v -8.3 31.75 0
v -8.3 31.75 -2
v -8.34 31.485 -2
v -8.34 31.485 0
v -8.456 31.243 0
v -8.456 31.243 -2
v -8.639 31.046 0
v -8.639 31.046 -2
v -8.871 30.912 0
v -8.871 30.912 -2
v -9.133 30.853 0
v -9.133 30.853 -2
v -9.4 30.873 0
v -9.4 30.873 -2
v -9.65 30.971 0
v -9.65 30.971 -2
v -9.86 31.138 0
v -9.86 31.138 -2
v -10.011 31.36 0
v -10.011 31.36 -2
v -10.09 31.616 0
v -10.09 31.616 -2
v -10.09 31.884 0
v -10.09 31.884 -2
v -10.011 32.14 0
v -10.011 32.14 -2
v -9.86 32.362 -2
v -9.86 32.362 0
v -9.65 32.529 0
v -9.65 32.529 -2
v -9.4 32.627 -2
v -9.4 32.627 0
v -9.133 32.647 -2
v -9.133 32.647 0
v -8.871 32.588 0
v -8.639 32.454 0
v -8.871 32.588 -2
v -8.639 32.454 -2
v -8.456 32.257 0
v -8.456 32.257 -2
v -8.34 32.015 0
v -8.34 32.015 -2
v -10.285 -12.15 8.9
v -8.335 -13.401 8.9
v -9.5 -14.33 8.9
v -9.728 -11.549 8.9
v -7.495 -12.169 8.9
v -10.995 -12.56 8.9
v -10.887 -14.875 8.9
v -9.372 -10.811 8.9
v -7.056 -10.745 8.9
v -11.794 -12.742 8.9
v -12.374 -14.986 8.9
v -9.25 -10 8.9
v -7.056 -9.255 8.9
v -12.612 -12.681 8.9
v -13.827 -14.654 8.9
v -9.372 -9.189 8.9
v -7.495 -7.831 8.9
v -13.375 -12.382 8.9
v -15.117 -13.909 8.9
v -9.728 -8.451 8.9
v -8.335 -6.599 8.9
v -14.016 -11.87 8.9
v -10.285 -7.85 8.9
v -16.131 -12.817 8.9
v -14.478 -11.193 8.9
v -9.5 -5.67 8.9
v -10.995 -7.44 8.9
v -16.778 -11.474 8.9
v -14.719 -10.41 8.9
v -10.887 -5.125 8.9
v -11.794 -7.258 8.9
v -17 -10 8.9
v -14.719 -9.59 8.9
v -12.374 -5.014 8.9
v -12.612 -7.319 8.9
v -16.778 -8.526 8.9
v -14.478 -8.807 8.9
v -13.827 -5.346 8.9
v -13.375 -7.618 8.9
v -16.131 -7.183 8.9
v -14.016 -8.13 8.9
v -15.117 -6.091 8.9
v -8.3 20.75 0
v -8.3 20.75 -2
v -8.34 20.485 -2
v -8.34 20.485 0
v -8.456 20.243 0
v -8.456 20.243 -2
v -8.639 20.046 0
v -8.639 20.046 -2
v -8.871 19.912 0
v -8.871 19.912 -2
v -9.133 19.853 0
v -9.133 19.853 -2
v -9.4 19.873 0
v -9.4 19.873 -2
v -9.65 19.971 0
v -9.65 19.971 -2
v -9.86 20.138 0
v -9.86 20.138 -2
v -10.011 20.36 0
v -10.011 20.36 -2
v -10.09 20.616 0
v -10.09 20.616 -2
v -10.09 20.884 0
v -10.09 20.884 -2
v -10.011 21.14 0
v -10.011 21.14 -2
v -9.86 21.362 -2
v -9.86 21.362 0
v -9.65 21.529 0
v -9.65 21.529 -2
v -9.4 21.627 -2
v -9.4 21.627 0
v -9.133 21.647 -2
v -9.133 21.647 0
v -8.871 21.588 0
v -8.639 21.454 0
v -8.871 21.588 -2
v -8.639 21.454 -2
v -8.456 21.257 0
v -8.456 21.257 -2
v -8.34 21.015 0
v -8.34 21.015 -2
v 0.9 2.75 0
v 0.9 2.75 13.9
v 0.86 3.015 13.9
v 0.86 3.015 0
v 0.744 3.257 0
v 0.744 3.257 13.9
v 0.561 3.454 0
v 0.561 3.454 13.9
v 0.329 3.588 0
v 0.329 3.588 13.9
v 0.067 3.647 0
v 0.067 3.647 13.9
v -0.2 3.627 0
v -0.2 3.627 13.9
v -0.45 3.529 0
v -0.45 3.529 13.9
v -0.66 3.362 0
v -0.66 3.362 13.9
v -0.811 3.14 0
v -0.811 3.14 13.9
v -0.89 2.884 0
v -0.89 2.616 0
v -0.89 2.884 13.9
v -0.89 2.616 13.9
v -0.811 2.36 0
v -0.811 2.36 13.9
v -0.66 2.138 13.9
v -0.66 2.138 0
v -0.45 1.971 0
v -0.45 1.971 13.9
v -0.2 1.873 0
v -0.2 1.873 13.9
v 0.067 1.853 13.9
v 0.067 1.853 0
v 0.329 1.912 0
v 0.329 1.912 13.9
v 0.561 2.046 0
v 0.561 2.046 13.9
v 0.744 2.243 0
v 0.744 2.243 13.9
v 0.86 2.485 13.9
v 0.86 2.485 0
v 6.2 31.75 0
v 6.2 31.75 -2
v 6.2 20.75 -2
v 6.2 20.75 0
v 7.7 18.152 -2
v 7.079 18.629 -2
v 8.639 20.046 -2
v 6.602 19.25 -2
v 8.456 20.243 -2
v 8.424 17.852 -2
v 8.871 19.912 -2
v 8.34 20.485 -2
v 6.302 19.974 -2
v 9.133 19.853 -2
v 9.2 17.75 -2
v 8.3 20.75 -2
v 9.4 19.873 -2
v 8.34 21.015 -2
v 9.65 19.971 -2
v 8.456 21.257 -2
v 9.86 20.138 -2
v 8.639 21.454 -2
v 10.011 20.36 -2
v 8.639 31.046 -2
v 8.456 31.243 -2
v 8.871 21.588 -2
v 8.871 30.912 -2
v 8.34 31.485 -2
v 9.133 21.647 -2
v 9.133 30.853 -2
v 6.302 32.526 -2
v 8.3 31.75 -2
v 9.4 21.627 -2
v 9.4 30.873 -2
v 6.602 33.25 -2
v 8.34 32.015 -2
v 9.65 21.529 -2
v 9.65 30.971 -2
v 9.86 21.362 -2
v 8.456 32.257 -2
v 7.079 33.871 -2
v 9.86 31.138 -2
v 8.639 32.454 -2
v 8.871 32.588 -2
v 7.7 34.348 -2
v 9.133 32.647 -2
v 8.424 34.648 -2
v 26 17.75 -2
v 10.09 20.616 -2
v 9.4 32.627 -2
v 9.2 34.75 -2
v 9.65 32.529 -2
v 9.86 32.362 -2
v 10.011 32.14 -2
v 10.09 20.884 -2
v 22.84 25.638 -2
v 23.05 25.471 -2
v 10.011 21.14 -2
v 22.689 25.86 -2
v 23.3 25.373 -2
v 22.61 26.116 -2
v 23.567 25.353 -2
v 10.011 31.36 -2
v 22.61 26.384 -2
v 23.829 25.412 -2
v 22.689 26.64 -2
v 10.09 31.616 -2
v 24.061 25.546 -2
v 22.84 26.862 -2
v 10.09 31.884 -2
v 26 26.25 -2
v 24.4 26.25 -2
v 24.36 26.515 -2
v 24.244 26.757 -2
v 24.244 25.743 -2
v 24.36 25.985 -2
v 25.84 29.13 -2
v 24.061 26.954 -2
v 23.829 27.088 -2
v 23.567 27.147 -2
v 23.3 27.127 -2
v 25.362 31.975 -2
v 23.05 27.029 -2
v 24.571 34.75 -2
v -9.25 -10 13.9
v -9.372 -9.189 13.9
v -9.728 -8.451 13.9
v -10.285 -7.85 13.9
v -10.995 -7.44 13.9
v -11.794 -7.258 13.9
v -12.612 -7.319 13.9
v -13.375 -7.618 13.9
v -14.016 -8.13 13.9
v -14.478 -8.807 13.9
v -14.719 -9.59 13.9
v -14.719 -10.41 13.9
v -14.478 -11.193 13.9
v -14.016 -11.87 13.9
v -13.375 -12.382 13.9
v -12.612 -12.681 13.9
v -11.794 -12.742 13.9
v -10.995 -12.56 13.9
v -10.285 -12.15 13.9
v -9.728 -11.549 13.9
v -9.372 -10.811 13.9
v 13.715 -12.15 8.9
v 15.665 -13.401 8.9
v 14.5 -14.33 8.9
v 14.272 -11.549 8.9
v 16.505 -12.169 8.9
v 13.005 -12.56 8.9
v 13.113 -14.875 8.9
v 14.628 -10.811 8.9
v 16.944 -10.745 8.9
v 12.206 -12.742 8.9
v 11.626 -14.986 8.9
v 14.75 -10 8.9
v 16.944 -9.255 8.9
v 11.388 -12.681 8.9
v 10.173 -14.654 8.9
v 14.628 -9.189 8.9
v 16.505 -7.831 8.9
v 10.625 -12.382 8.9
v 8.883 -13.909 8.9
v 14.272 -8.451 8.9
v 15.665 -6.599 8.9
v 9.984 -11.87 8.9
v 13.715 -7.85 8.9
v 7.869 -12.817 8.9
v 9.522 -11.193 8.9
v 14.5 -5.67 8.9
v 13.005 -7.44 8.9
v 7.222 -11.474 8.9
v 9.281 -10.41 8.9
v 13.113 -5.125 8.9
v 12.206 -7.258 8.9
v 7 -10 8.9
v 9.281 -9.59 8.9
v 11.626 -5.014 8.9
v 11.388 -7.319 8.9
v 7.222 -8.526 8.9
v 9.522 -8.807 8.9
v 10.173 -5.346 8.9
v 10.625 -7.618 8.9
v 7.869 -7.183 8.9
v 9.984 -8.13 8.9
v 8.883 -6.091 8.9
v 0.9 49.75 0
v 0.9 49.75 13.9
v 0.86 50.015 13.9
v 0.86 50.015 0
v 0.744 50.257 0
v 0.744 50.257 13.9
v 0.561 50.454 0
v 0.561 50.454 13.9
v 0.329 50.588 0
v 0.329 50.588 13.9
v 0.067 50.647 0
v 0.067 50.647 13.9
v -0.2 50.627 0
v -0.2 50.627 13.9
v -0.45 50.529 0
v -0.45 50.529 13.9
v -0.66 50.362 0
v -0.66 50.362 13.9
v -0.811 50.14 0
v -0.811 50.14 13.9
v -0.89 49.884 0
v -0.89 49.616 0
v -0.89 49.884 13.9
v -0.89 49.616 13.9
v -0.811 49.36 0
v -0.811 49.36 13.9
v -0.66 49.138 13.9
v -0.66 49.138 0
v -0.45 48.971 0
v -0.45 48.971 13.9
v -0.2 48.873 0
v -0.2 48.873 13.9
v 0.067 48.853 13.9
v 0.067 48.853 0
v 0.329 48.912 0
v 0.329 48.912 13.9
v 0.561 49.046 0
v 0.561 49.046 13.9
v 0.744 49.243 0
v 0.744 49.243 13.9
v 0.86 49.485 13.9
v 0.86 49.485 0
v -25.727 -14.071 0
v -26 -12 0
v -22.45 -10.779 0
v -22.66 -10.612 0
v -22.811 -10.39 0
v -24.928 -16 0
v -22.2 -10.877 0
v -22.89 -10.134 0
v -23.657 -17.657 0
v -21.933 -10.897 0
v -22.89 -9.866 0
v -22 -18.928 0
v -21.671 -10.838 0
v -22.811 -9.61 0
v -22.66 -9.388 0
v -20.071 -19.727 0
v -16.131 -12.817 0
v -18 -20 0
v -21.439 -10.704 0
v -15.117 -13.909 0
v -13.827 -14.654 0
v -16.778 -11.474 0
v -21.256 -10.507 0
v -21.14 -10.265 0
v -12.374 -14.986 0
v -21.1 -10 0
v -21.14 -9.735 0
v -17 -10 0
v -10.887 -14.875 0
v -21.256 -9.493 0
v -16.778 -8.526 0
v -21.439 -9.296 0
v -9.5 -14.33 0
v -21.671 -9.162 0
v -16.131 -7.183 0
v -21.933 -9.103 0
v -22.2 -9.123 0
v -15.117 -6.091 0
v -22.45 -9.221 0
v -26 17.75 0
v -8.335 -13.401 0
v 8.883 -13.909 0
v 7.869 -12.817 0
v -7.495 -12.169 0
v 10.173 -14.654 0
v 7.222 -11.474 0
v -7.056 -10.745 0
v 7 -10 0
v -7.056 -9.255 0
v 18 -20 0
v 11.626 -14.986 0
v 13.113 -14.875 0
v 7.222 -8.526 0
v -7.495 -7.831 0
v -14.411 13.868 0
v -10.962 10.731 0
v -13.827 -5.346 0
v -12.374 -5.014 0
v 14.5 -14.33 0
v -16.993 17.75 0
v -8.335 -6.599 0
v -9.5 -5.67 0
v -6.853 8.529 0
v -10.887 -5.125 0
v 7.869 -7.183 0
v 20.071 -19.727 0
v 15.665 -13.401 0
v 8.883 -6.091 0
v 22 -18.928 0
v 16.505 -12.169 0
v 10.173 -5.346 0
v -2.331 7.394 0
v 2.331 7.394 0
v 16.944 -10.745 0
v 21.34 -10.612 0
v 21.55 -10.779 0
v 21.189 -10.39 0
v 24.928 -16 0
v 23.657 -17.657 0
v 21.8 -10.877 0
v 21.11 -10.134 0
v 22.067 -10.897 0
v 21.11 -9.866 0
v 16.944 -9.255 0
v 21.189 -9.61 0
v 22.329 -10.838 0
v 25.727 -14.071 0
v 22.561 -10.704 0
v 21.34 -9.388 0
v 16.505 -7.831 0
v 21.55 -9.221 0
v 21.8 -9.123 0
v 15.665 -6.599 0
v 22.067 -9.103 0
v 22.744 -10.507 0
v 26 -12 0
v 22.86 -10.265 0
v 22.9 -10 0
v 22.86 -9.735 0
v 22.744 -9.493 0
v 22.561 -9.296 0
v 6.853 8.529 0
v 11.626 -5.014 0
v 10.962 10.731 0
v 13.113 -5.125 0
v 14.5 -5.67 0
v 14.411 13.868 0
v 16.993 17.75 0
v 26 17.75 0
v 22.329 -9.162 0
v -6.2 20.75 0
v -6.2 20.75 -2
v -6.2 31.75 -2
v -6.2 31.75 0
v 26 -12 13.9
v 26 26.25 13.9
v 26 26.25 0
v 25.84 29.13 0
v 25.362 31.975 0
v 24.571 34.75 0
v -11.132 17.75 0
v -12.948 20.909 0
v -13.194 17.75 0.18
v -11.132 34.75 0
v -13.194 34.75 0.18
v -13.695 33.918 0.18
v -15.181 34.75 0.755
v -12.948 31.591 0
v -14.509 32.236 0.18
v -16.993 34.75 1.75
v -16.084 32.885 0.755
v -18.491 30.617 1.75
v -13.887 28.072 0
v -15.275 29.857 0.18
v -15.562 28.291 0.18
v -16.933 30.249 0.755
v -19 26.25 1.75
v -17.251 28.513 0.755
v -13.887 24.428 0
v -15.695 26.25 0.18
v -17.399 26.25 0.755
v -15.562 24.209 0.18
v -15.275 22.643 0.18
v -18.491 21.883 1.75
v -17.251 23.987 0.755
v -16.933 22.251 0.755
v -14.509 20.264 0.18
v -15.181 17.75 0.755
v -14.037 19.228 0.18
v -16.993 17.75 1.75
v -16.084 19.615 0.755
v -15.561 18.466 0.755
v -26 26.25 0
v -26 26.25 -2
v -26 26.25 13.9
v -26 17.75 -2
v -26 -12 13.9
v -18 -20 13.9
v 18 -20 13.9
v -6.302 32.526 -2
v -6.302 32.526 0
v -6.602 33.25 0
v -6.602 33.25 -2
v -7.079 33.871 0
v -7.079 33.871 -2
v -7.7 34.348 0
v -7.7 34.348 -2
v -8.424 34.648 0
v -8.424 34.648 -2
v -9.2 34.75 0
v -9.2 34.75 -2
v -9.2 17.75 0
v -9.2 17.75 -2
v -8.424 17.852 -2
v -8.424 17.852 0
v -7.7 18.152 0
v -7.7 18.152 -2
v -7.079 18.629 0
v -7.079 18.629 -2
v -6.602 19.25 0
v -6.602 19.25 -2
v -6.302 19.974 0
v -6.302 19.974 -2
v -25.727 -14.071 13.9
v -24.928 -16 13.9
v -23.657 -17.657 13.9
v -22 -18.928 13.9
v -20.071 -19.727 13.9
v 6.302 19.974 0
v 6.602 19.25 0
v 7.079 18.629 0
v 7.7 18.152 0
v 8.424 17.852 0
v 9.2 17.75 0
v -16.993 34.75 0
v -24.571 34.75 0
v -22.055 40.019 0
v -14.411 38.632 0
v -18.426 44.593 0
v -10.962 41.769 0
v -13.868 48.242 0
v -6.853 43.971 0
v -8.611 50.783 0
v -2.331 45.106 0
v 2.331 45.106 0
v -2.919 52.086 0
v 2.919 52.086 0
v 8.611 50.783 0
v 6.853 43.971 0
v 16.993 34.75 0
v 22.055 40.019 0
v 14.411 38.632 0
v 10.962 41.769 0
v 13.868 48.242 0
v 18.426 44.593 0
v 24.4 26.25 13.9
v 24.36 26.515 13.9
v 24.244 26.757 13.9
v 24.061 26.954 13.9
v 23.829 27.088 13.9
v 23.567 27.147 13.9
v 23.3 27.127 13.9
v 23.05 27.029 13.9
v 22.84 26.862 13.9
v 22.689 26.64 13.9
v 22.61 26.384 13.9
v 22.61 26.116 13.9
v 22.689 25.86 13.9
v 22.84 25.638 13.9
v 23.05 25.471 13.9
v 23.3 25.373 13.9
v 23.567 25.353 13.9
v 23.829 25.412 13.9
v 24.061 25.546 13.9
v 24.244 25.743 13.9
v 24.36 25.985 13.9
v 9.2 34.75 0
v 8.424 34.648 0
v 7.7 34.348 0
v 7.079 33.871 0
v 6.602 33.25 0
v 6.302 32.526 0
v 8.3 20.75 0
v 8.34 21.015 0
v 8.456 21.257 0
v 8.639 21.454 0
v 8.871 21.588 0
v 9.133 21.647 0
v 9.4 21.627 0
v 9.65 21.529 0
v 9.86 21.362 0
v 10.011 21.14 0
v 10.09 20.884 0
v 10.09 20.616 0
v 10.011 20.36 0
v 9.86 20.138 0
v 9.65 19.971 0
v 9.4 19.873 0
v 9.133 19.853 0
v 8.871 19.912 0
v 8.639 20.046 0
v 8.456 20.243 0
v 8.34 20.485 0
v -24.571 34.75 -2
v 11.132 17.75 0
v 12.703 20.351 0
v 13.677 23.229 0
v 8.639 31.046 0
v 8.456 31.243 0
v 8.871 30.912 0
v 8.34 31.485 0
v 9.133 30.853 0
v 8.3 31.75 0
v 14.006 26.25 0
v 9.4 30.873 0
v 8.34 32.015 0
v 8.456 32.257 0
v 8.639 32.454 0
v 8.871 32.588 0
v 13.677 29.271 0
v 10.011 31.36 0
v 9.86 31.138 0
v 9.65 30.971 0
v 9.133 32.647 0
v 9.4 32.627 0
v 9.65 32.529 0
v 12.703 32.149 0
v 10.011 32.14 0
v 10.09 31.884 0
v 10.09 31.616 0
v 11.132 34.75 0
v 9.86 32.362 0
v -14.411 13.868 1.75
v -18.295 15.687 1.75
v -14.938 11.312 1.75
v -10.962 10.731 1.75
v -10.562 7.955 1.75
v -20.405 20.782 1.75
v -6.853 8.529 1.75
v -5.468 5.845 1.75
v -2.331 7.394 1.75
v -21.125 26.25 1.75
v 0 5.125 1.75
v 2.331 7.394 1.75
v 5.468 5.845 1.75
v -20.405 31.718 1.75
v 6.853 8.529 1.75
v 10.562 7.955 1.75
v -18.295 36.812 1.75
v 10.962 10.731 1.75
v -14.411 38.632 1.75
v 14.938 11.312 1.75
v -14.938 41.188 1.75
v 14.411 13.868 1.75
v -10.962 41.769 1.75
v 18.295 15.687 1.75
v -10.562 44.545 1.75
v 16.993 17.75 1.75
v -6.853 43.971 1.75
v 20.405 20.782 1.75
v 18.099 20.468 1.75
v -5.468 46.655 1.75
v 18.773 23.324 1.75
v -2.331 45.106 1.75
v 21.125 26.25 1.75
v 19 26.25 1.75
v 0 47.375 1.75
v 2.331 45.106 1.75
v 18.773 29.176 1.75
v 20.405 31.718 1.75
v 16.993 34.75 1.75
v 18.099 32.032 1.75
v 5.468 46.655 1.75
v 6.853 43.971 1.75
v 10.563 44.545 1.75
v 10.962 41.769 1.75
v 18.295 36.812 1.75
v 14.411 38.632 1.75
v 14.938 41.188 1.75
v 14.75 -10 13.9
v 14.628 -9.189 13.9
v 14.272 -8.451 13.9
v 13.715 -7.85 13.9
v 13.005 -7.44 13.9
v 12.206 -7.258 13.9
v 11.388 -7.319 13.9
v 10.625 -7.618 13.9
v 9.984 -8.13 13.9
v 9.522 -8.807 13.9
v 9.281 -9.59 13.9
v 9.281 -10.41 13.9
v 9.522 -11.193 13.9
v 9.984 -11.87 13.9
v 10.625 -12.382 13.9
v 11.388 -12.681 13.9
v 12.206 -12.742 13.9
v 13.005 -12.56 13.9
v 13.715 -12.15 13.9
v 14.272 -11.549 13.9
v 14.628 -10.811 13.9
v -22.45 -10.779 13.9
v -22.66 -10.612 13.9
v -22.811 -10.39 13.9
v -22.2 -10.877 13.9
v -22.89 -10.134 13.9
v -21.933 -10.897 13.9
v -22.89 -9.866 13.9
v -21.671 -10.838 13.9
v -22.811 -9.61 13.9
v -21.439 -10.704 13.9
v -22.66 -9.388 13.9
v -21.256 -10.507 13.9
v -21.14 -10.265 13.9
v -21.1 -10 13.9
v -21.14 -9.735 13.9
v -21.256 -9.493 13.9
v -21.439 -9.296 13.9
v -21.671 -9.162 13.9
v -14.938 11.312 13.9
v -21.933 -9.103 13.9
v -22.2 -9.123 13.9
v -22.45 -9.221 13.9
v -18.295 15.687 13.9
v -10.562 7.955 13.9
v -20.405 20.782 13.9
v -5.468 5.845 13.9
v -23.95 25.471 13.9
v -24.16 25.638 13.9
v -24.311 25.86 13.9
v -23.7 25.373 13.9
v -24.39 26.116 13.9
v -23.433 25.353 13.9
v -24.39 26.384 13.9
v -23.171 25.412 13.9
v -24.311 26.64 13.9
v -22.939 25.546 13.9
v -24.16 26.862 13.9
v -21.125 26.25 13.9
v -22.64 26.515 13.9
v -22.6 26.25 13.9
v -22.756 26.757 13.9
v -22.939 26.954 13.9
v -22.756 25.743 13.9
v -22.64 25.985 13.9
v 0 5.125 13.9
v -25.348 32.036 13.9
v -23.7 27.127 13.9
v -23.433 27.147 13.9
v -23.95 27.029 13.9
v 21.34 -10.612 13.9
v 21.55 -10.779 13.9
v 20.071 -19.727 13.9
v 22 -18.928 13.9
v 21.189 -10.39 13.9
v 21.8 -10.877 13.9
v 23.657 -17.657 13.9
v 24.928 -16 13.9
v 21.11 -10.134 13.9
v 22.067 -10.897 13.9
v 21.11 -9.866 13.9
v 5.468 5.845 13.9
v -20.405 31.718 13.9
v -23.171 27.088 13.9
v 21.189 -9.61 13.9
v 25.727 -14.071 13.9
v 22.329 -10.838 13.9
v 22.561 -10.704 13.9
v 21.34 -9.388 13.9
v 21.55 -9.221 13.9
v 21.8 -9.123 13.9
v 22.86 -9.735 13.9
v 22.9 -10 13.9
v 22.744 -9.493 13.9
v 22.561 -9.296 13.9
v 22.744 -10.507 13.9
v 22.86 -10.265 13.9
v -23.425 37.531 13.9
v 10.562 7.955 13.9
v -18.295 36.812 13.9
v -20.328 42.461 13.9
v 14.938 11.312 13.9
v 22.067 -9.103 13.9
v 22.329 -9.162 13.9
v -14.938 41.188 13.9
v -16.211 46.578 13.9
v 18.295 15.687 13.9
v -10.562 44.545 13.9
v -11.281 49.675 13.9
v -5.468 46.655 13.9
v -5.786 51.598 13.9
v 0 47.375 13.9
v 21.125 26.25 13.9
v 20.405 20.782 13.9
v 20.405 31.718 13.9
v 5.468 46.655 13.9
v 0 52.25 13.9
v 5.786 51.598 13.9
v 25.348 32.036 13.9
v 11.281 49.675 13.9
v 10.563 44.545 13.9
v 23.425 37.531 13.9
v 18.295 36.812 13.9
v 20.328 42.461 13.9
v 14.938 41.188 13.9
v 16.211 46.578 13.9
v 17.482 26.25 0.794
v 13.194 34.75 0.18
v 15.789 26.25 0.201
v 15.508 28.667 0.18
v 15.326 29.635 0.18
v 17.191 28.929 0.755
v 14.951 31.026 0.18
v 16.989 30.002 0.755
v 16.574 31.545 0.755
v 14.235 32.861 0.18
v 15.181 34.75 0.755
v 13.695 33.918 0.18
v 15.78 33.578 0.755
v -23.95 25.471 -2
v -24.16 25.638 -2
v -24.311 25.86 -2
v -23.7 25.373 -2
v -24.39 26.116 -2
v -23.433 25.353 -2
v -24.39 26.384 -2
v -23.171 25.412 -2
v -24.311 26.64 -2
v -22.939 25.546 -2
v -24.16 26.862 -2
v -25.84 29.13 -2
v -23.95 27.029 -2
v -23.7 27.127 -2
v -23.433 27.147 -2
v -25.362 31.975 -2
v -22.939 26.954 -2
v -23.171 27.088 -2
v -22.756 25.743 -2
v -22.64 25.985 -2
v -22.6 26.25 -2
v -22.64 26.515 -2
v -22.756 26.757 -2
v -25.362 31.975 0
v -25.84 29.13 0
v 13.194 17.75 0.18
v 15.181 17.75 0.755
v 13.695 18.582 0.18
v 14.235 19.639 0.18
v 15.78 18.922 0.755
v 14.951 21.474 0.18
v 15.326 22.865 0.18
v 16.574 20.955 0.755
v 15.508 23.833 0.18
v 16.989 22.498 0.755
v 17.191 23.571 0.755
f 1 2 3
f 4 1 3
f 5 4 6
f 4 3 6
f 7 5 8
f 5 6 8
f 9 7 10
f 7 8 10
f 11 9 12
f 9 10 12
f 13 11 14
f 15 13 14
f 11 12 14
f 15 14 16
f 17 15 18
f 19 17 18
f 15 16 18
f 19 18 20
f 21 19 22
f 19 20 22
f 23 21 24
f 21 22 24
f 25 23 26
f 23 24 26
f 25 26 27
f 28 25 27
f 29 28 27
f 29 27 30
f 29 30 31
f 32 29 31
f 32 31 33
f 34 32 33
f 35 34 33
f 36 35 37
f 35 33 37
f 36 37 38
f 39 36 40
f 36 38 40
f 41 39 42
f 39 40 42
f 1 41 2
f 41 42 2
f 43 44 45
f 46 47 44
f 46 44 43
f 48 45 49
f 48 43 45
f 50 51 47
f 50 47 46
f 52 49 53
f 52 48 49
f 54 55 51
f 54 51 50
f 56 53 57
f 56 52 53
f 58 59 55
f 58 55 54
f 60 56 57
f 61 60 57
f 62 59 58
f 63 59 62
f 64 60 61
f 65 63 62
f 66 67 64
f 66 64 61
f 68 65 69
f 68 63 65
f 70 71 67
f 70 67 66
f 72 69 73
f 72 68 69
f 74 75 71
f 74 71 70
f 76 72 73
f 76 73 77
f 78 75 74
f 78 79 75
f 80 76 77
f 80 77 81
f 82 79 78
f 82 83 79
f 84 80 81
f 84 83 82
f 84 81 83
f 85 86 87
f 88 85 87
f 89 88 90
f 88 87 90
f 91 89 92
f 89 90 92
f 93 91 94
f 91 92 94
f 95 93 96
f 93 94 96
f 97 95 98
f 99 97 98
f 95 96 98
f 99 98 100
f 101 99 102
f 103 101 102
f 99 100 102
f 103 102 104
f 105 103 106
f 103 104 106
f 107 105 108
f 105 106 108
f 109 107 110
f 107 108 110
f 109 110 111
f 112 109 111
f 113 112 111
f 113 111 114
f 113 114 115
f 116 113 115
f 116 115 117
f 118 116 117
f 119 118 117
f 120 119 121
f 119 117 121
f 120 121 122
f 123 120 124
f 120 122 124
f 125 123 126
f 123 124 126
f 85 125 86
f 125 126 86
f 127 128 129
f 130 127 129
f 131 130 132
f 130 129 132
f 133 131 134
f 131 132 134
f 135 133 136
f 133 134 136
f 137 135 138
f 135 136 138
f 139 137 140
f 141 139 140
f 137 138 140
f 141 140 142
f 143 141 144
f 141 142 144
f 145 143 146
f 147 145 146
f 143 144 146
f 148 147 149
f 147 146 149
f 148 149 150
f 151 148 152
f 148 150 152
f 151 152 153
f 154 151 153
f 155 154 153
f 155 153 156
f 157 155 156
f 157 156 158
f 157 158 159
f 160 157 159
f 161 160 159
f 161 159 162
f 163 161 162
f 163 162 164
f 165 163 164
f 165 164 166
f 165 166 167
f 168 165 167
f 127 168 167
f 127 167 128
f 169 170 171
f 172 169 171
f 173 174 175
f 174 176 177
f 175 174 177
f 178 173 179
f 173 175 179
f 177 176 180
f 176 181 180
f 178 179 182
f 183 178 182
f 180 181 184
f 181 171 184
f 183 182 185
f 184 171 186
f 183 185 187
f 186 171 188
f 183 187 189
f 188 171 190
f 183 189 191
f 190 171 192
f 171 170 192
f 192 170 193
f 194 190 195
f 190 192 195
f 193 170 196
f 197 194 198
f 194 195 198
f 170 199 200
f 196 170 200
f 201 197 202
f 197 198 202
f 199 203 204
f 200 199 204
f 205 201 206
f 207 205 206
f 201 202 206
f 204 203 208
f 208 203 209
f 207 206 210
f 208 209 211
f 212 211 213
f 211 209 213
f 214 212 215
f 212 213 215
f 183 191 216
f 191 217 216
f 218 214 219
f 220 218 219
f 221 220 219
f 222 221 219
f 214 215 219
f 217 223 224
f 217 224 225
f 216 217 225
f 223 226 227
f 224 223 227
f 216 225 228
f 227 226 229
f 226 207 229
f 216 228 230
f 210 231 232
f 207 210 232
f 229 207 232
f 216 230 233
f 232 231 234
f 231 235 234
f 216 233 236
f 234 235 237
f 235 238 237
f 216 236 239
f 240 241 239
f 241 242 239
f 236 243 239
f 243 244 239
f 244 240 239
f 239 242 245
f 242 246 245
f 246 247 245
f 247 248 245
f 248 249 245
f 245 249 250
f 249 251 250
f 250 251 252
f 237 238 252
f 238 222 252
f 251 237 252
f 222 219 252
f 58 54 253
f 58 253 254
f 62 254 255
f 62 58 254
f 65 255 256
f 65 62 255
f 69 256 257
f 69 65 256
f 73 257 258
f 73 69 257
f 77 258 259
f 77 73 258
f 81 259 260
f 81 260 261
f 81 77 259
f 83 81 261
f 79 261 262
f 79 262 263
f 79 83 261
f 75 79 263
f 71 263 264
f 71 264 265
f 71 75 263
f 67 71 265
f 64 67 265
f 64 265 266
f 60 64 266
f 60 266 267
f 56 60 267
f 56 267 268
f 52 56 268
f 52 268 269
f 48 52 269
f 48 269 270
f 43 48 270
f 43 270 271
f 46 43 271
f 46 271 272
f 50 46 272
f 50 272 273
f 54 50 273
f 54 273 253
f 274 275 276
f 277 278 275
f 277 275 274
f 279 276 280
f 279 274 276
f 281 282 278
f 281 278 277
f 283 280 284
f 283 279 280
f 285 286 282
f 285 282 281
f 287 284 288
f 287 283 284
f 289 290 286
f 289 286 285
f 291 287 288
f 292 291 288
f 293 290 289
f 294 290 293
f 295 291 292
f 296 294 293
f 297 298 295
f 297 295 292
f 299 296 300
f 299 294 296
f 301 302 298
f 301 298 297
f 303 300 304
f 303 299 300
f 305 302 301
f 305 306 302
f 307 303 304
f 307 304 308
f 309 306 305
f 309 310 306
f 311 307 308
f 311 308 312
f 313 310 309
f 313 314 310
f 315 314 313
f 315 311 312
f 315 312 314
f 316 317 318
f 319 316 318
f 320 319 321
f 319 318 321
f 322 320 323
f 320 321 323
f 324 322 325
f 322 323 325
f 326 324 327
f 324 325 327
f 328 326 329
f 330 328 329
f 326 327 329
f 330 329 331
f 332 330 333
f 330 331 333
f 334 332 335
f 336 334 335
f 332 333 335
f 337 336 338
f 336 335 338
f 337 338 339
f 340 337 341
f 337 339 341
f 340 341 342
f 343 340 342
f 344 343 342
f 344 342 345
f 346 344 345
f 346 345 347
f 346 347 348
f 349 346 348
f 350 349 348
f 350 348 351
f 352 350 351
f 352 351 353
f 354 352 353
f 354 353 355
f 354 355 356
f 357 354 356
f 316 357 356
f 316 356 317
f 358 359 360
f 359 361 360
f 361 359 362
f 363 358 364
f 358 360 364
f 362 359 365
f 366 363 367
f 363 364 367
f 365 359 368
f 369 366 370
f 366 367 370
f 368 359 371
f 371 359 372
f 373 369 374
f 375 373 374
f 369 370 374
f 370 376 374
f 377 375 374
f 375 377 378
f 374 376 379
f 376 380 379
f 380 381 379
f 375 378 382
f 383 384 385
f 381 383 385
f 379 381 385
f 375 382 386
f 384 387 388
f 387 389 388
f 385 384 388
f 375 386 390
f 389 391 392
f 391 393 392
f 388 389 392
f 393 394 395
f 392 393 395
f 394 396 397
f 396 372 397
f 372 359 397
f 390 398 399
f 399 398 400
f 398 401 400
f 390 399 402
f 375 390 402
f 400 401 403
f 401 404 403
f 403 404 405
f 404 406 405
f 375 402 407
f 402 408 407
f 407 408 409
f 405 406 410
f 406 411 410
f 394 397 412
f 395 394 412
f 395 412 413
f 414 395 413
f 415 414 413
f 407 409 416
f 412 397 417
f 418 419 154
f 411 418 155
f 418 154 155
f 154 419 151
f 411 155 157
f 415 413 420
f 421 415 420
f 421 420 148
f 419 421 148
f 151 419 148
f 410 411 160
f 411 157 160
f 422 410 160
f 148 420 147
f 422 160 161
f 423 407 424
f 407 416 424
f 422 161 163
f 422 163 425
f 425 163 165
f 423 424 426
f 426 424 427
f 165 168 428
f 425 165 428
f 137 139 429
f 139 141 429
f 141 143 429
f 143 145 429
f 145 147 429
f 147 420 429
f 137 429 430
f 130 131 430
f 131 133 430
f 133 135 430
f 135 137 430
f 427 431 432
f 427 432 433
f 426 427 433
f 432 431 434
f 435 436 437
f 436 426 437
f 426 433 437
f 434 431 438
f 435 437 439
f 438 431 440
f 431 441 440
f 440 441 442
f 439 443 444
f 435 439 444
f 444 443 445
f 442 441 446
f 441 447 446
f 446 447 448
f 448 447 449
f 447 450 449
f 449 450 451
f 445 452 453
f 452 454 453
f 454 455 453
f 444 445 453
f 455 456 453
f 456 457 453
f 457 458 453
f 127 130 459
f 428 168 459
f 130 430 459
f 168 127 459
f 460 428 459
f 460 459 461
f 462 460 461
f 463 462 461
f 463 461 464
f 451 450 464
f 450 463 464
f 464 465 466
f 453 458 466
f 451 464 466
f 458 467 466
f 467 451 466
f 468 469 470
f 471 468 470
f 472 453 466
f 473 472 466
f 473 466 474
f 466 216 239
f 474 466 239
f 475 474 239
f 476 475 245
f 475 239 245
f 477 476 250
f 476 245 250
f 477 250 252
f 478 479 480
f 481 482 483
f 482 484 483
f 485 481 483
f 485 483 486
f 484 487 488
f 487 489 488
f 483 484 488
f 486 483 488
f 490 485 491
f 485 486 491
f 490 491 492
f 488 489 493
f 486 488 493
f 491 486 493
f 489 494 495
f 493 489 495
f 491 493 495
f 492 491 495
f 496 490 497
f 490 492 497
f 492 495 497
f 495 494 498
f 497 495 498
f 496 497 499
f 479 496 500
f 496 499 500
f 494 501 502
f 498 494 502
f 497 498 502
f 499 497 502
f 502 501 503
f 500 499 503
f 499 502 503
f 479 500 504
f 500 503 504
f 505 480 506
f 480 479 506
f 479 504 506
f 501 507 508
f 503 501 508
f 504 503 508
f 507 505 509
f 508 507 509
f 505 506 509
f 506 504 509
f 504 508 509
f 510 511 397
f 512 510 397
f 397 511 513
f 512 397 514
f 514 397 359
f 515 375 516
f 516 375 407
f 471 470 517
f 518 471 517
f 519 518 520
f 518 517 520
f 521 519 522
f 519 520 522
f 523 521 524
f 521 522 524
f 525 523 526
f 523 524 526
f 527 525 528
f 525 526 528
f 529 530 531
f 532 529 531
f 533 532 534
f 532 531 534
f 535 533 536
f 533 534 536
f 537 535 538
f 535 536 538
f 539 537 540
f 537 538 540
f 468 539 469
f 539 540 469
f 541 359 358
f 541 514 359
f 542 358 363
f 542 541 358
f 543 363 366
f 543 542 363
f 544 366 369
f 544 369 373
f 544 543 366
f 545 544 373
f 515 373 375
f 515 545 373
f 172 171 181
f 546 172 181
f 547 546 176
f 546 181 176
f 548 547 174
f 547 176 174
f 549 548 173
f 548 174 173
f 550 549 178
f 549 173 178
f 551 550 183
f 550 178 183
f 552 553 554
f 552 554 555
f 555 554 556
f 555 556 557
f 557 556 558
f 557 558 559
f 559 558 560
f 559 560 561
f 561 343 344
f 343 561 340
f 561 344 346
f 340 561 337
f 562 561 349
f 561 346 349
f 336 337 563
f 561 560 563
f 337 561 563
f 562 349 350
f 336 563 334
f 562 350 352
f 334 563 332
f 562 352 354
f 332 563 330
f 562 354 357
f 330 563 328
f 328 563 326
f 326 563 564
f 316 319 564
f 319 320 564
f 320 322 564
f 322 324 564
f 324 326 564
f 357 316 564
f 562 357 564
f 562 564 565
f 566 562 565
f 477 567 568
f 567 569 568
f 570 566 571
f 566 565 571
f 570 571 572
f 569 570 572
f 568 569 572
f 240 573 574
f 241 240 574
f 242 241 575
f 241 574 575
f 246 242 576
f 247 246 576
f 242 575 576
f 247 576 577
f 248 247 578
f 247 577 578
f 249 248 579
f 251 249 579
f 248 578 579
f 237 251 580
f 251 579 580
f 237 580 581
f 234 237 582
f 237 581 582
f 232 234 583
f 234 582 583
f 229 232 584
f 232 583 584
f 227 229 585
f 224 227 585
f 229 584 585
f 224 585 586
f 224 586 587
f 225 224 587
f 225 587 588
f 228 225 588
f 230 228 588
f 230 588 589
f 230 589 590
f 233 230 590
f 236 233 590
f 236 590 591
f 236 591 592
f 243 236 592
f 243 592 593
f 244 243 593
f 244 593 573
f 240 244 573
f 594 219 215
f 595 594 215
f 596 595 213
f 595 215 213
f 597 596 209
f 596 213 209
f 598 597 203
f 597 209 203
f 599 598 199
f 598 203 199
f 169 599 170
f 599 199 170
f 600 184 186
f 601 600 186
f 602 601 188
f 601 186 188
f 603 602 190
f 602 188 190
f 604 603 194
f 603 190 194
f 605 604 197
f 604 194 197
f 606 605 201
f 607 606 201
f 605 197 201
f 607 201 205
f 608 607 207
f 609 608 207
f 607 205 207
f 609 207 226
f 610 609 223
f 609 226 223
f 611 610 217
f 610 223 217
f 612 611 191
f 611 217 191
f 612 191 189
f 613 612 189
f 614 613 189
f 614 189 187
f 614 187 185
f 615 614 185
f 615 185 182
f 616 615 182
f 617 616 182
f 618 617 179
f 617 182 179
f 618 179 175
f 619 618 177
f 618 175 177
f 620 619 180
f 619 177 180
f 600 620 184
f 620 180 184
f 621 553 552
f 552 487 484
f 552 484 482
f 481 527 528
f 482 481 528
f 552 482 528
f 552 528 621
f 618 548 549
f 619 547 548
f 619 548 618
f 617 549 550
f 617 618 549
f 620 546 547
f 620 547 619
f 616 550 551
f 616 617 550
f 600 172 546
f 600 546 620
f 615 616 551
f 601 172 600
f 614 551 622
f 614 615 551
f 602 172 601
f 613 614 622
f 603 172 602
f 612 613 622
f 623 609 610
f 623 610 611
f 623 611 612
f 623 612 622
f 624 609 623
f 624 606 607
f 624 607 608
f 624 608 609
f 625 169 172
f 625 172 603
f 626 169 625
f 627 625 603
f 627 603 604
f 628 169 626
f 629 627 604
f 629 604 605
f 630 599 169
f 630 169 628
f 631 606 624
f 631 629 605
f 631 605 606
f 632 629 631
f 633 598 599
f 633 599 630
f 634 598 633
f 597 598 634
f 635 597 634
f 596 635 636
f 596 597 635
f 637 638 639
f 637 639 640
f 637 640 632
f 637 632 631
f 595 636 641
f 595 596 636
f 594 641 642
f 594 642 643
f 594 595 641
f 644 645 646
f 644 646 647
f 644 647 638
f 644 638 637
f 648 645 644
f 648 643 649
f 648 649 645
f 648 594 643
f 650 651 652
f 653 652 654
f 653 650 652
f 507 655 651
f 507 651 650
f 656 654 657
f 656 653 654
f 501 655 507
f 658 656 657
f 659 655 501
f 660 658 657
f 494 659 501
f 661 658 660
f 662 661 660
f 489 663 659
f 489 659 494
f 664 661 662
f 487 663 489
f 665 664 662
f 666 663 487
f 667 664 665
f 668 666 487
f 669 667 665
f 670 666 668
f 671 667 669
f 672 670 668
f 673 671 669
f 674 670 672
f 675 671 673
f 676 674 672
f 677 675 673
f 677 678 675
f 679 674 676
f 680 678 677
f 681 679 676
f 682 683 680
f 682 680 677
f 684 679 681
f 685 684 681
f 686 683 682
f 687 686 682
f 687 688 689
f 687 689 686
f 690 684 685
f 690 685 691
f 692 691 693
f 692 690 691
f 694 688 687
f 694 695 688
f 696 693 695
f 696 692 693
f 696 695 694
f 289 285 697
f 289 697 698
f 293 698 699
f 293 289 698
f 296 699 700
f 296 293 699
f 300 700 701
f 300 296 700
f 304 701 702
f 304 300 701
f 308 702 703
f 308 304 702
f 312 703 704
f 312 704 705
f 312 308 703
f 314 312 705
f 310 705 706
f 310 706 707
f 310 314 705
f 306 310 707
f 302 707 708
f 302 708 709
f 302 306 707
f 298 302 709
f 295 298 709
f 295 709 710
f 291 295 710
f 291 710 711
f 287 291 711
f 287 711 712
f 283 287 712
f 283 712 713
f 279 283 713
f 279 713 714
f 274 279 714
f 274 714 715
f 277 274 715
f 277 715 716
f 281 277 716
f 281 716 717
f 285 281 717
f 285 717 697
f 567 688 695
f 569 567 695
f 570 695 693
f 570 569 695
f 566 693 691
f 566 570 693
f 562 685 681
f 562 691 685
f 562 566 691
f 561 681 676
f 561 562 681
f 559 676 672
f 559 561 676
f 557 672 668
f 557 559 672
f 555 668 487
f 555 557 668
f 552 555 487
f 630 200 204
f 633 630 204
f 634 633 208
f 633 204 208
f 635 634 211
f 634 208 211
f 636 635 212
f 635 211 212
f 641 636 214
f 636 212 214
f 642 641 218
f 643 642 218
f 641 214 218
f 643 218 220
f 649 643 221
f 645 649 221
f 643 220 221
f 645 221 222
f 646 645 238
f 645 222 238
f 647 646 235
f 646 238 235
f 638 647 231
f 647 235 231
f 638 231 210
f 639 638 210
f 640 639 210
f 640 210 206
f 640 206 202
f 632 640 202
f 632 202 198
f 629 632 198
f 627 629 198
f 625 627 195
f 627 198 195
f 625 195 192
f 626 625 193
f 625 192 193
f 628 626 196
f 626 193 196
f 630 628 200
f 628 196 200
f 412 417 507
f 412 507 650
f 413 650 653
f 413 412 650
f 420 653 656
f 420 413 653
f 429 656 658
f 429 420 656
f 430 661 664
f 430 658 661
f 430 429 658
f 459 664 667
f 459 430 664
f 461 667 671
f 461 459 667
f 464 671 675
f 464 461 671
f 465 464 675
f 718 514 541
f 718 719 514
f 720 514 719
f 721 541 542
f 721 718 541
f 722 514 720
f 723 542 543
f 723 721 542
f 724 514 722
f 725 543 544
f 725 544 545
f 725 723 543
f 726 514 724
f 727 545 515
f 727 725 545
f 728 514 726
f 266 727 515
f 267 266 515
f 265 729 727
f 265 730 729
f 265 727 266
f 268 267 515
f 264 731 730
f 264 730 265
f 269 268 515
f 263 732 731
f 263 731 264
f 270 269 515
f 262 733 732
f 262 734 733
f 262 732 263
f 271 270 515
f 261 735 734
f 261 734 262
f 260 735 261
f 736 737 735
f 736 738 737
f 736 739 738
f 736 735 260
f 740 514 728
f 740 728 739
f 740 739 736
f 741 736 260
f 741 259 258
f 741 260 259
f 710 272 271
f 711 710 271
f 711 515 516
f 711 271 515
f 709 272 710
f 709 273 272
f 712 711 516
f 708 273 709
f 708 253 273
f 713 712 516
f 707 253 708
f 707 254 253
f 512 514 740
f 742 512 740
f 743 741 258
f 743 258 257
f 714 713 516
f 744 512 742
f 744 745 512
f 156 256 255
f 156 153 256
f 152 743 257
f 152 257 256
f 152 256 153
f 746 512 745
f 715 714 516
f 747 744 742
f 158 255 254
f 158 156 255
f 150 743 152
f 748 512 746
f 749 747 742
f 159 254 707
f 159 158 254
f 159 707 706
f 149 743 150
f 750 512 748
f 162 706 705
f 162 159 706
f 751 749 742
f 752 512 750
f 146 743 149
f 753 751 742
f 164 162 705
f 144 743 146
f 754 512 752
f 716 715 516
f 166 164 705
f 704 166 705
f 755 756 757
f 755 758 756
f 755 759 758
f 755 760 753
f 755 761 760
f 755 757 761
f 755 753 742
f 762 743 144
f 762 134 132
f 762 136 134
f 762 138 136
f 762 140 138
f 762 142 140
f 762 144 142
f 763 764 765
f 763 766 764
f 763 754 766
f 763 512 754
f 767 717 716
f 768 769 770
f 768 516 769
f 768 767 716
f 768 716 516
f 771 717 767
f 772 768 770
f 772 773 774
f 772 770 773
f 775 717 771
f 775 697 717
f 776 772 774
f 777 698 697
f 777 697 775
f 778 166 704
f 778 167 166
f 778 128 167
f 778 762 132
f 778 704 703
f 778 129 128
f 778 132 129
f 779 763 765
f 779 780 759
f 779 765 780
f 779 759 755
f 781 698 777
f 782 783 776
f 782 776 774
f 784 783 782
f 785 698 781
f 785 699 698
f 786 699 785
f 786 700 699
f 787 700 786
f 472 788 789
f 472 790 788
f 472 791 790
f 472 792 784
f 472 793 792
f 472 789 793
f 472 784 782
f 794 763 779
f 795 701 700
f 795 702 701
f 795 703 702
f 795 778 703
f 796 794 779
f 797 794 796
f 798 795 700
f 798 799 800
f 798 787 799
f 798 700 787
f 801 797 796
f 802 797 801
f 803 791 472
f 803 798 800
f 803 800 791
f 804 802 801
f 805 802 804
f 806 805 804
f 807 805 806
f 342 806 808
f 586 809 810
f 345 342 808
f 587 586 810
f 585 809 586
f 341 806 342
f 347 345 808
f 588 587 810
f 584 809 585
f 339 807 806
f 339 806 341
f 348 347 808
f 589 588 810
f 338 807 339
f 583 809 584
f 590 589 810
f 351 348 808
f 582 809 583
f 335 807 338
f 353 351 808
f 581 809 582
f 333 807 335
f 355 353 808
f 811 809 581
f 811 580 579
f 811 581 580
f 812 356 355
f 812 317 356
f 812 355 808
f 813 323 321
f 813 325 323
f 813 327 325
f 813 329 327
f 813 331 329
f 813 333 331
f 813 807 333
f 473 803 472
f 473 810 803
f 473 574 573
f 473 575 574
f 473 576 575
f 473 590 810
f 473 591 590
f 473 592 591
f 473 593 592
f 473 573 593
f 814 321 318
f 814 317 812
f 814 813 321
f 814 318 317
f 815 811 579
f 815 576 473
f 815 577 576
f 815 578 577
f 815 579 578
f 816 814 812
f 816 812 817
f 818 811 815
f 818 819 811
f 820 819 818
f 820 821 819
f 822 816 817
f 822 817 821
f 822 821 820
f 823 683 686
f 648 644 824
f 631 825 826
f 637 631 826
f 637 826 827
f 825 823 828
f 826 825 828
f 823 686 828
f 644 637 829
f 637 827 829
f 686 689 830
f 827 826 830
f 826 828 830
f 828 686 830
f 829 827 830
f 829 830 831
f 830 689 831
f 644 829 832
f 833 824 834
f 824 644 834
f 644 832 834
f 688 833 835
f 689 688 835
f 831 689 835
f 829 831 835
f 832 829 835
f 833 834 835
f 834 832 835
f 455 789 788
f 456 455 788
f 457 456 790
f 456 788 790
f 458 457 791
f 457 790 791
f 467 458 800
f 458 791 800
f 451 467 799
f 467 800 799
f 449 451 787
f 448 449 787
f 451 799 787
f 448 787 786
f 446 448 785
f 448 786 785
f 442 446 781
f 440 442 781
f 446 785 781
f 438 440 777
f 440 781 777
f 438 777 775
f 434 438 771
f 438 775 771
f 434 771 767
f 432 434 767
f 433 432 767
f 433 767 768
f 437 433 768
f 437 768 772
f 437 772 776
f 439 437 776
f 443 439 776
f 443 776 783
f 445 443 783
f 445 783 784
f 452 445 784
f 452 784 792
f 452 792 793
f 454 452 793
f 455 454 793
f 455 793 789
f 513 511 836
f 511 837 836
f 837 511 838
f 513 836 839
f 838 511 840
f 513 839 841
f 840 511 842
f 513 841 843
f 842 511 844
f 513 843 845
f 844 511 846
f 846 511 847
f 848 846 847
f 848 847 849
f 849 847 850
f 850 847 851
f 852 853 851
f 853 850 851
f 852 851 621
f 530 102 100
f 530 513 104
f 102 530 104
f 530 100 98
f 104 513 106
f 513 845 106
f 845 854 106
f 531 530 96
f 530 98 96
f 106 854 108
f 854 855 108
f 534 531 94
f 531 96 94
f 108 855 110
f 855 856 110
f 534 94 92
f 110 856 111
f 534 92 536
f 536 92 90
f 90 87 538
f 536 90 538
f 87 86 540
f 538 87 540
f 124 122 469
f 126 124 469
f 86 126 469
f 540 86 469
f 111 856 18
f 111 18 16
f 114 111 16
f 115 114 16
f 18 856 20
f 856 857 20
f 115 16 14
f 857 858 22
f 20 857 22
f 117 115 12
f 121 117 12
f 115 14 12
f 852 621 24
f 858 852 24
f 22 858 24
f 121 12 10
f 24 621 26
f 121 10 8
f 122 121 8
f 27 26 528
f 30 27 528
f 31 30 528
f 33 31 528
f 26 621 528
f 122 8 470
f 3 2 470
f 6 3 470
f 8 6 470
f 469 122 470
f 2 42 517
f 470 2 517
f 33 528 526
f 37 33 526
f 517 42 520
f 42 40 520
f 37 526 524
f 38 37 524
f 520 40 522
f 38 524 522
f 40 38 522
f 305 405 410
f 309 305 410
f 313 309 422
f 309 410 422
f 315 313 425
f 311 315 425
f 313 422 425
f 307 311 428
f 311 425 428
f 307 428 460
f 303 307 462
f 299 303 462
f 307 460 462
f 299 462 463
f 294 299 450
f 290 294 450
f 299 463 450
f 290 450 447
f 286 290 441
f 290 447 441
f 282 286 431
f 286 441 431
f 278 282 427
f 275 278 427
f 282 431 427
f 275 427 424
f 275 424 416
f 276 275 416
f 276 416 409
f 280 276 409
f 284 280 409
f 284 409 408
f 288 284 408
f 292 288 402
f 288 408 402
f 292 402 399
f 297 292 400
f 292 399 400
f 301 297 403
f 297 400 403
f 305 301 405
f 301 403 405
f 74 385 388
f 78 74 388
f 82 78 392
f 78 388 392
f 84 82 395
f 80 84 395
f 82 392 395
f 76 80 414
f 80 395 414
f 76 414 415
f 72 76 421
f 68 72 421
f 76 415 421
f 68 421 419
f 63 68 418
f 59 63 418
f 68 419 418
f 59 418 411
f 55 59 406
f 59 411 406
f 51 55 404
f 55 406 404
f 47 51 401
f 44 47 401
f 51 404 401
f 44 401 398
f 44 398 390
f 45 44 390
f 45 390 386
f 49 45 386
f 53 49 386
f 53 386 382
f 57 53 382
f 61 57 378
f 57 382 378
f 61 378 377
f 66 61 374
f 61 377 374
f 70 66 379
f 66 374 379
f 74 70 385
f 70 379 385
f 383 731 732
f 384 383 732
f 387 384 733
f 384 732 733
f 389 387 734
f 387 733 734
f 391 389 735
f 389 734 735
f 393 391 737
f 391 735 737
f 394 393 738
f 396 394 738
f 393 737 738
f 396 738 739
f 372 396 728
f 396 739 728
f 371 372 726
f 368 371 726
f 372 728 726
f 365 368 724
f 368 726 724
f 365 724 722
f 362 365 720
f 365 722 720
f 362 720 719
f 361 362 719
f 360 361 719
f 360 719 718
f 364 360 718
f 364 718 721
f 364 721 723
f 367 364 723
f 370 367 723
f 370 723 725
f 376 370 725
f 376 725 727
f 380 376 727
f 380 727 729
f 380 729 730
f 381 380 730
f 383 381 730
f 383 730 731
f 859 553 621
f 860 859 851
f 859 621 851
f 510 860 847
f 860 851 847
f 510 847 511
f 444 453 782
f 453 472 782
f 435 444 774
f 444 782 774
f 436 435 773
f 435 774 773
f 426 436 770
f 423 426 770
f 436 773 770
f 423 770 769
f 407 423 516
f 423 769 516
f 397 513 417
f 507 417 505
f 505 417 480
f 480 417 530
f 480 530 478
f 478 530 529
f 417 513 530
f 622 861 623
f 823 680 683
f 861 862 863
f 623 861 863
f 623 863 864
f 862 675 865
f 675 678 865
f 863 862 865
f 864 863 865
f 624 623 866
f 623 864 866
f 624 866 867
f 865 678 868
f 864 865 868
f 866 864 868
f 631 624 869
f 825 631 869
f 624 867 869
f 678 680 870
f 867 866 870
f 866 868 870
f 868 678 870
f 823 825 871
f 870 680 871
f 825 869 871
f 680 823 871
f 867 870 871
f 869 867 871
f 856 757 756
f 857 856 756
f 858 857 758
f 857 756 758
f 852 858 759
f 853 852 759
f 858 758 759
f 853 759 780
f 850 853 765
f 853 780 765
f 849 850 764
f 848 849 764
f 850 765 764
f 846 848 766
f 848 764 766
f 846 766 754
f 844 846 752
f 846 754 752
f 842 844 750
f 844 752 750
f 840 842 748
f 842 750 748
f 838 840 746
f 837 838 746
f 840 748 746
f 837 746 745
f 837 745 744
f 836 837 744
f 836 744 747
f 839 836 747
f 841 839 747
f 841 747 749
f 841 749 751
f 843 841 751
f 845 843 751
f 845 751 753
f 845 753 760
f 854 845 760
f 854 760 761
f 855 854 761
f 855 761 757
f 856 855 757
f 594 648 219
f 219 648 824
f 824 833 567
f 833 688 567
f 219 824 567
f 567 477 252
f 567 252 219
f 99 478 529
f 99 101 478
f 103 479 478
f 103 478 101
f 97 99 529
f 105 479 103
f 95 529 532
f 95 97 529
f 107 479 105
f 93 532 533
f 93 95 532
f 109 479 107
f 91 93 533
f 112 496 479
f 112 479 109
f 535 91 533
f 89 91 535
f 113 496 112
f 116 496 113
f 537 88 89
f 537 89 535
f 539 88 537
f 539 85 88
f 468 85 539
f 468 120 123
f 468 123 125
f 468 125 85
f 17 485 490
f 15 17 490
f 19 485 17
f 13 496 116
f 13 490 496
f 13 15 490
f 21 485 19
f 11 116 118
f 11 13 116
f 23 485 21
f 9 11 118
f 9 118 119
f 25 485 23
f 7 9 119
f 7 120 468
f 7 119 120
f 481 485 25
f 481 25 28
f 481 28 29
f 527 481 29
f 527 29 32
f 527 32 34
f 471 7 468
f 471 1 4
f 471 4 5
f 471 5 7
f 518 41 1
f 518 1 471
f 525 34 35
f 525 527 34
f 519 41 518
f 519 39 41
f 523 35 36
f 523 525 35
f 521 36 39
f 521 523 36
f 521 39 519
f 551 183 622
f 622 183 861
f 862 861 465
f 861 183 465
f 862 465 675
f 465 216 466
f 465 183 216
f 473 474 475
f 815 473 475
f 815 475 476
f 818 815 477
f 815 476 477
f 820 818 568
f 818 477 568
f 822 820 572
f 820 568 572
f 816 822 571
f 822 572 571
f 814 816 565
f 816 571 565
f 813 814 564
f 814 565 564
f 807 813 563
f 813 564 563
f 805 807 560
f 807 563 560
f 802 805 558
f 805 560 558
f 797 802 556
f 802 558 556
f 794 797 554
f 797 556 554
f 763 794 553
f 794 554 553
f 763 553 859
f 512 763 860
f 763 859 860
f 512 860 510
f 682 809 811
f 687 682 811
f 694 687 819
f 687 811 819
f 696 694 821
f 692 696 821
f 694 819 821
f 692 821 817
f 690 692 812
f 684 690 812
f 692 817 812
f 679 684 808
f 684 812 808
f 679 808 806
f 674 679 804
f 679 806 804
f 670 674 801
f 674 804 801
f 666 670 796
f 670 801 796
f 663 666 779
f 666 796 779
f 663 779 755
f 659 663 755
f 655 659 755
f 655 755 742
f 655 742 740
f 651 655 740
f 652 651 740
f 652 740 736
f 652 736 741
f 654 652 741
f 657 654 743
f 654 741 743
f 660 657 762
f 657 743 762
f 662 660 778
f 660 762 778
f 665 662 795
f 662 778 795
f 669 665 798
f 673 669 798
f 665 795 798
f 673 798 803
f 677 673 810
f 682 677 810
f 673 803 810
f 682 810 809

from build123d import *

# Parameters (mm, degrees)
SKETCH_2_R          = 19
SKETCH_2_R_2        = 2.75
EXTRUDE_1_DEPTH     = 13.9
SKETCH_3_R          = 21.125
CUT_EXTRUDE_1_DEPTH = 12.15
SKETCH_4_R          = 5
CUT_EXTRUDE_2_DEPTH = 8.9
FILLET_1_R          = 8
EXTRUDE_START       = 2
SKETCH_7_R          = 0.9
EXTRUDE_2_DEPTH     = 2
SKETCH_5_R          = 0.9
CUT_EXTRUDE_3_DEPTH = 61.488614631
FILLET_2_R          = 8


with BuildPart() as part:
    # Эскиз2 → Бобышка-Вытянуть1 (new body)
    with BuildSketch(Plane.XY):
        with BuildLine():
            ThreePointArc((26, 26.25), (0, 52.25), (-26, 26.25))
            Line((-26, 26.25), (-26, -20))
            Line((-26, -20), (26, -20))
            Line((26, -20), (26, 26.25))
        make_face()
        with Locations((0, 26.25)):
            Circle(SKETCH_2_R, mode=Mode.SUBTRACT)
        with Locations((12, -10)):
            Circle(SKETCH_2_R_2, mode=Mode.SUBTRACT)
        with Locations((-12, -10)):
            Circle(SKETCH_2_R_2, mode=Mode.SUBTRACT)
    extrude(amount=EXTRUDE_1_DEPTH)

    # Эскиз3 → Вырез-Вытянуть1 (cut)
    with BuildSketch(Plane.XY.offset(13.9)):
        with Locations((0, 26.25)):
            Circle(SKETCH_3_R)
    extrude(amount=-CUT_EXTRUDE_1_DEPTH, mode=Mode.SUBTRACT)

    # Эскиз4 → Вырез-Вытянуть2 (cut)
    with BuildSketch(Plane(origin=(0, 0, 0), x_dir=(-1, 0, 0), z_dir=(0, 0, -1))):
        with Locations((-12, -10)):
            Circle(SKETCH_4_R)
        with Locations((12, -10)):
            Circle(SKETCH_4_R)
    extrude(amount=-CUT_EXTRUDE_2_DEPTH, mode=Mode.SUBTRACT)

    # Скругление1
    fillet_1_edges = [part.edges().sort_by_distance(p)[0] for p in [
        (26, -20, 6.95),
        (-26, -20, 6.95),
    ]]
    fillet(fillet_1_edges, radius=FILLET_1_R)

    # Эскиз7 → Бобышка-Вытянуть2 (add)
    # profile 1 of 2: a face of its own
    with BuildSketch(Plane(origin=(0, 0, 0), x_dir=(-1, 0, 0), z_dir=(0, 0, -1)).offset(EXTRUDE_START)):
        with BuildLine():
            Line((-24.571324751, 34.75), (-9.2, 34.75))
            ThreePointArc((-9.2, 34.75), (-7.078679656, 33.871320344), (-6.2, 31.75))
            Line((-6.2, 31.75), (-6.2, 20.75))
            ThreePointArc((-6.2, 20.75), (-7.078679656, 18.628679656), (-9.2, 17.75))
            Line((-9.2, 17.75), (-26, 17.75))
            Line((-26, 17.75), (-26, 26.25))
            ThreePointArc((-26, 26.25), (-25.640343636, 30.559614628), (-24.571324751, 34.75))
        make_face()
        with Locations((-9.2, 31.75)):
            Circle(SKETCH_7_R, mode=Mode.SUBTRACT)
        with Locations((-9.2, 20.75)):
            Circle(SKETCH_7_R, mode=Mode.SUBTRACT)
    # profile 2 of 2: a face of its own
    with BuildSketch(Plane(origin=(0, 0, 0), x_dir=(-1, 0, 0), z_dir=(0, 0, -1)).offset(EXTRUDE_START)):
        with BuildLine():
            Line((26, 26.25), (26, 17.75))
            Line((26, 17.75), (9.2, 17.75))
            ThreePointArc((9.2, 17.75), (7.078679656, 18.628679656), (6.2, 20.75))
            Line((6.2, 20.75), (6.2, 31.75))
            ThreePointArc((6.2, 31.75), (7.078679656, 33.871320344), (9.2, 34.75))
            Line((9.2, 34.75), (24.571324751, 34.75))
            ThreePointArc((24.571324751, 34.75), (25.640343636, 30.559614628), (26, 26.25))
        make_face()
        with Locations(Location((9.2, 20.75, 0), (0, 0, 180))):
            Circle(SKETCH_7_R, mode=Mode.SUBTRACT)
        with Locations(Location((9.2, 31.75, 0), (0, 0, 180))):
            Circle(SKETCH_7_R, mode=Mode.SUBTRACT)
    extrude(amount=-EXTRUDE_2_DEPTH)

    # Эскиз5 → Вырез-Вытянуть3 (cut, through all)
    with BuildSketch(Plane.XY.offset(13.9)):
        with Locations((0, 49.75)):
            Circle(SKETCH_5_R)
        with Locations((-23.5, 26.25)):
            Circle(SKETCH_5_R)
        with Locations((0, 2.75)):
            Circle(SKETCH_5_R)
        with Locations((23.5, 26.25)):
            Circle(SKETCH_5_R)
        with Locations((-22, -10)):
            Circle(SKETCH_5_R)
        with Locations((22, -10)):
            Circle(SKETCH_5_R)
    extrude(amount=-CUT_EXTRUDE_3_DEPTH, mode=Mode.SUBTRACT)

    # Скругление2
    # the kernel refuses this fillet: 8 mm, written as the material it adds along each edge
    with BuildSketch(Plane(origin=(0, 26.25, 0), x_dir=(1, 0, 0), z_dir=(0, -1, 0))) as fillet_2_piece_1_section:
        with BuildLine():
            CenterArc((14.006253911, 8), FILLET_2_R, 270, 38.624832873)
            Line((14.006253911, 0), (19, 0))
            Line((19, 0), (19, 1.75))
        make_face()
    fillet_2_piece_1 = revolve(axis=Axis((0, 26.25, 0), (0, 0, 1)), revolution_arc=64.223731821, mode=Mode.PRIVATE)
    fillet_2_piece_1 = split(fillet_2_piece_1, bisect_by=Plane(origin=(15.779655811, 34.75, 0.435065896), z_dir=(0, -1, 0)), keep=Keep.TOP, mode=Mode.PRIVATE)
    add(fillet_2_piece_1)
    with BuildSketch(Plane(origin=(0, 26.25, 0), x_dir=(-0.43479598917537754, 0.900528982208238, 0), z_dir=(0.900528982208238, 0.43479598917537754, 0))) as fillet_2_piece_2_section:
        with BuildLine():
            CenterArc((14.006253911, 8), FILLET_2_R, 270, 38.624832873)
            Line((14.006253911, 0), (19, 0))
            Line((19, 0), (19, 1.75))
        make_face()
    fillet_2_piece_2 = revolve(axis=Axis((0, 26.25, 0), (0, 0, 1)), revolution_arc=128.45537387, mode=Mode.PRIVATE)
    fillet_2_piece_2 = split(fillet_2_piece_2, bisect_by=Plane(origin=(-16.657296725, 17.75, 0.435065896), z_dir=(0, 1, 0)), keep=Keep.TOP, mode=Mode.PRIVATE)
    fillet_2_piece_2 = split(fillet_2_piece_2, bisect_by=Plane(origin=(-16.657296725, 34.75, 0.435065896), z_dir=(0, -1, 0)), keep=Keep.TOP, mode=Mode.PRIVATE)
    add(fillet_2_piece_2)
    with BuildSketch(Plane(origin=(0, 26.25, 0), x_dir=(0.43485815144729206, -0.9004989661958774, 0), z_dir=(-0.9004989661958774, -0.43485815144729206, 0))) as fillet_2_piece_3_section:
        with BuildLine():
            CenterArc((14.006253911, 8), FILLET_2_R, 270, 38.624832873)
            Line((14.006253911, 0), (19, 0))
            Line((19, 0), (19, 1.75))
        make_face()
    fillet_2_piece_3 = revolve(axis=Axis((0, 26.25, 0), (0, 0, 1)), revolution_arc=64.223731821, mode=Mode.PRIVATE)
    fillet_2_piece_3 = split(fillet_2_piece_3, bisect_by=Plane(origin=(15.779655811, 17.75, 0.435065896), z_dir=(0, 1, 0)), keep=Keep.TOP, mode=Mode.PRIVATE)
    add(fillet_2_piece_3)


solid = part.part
